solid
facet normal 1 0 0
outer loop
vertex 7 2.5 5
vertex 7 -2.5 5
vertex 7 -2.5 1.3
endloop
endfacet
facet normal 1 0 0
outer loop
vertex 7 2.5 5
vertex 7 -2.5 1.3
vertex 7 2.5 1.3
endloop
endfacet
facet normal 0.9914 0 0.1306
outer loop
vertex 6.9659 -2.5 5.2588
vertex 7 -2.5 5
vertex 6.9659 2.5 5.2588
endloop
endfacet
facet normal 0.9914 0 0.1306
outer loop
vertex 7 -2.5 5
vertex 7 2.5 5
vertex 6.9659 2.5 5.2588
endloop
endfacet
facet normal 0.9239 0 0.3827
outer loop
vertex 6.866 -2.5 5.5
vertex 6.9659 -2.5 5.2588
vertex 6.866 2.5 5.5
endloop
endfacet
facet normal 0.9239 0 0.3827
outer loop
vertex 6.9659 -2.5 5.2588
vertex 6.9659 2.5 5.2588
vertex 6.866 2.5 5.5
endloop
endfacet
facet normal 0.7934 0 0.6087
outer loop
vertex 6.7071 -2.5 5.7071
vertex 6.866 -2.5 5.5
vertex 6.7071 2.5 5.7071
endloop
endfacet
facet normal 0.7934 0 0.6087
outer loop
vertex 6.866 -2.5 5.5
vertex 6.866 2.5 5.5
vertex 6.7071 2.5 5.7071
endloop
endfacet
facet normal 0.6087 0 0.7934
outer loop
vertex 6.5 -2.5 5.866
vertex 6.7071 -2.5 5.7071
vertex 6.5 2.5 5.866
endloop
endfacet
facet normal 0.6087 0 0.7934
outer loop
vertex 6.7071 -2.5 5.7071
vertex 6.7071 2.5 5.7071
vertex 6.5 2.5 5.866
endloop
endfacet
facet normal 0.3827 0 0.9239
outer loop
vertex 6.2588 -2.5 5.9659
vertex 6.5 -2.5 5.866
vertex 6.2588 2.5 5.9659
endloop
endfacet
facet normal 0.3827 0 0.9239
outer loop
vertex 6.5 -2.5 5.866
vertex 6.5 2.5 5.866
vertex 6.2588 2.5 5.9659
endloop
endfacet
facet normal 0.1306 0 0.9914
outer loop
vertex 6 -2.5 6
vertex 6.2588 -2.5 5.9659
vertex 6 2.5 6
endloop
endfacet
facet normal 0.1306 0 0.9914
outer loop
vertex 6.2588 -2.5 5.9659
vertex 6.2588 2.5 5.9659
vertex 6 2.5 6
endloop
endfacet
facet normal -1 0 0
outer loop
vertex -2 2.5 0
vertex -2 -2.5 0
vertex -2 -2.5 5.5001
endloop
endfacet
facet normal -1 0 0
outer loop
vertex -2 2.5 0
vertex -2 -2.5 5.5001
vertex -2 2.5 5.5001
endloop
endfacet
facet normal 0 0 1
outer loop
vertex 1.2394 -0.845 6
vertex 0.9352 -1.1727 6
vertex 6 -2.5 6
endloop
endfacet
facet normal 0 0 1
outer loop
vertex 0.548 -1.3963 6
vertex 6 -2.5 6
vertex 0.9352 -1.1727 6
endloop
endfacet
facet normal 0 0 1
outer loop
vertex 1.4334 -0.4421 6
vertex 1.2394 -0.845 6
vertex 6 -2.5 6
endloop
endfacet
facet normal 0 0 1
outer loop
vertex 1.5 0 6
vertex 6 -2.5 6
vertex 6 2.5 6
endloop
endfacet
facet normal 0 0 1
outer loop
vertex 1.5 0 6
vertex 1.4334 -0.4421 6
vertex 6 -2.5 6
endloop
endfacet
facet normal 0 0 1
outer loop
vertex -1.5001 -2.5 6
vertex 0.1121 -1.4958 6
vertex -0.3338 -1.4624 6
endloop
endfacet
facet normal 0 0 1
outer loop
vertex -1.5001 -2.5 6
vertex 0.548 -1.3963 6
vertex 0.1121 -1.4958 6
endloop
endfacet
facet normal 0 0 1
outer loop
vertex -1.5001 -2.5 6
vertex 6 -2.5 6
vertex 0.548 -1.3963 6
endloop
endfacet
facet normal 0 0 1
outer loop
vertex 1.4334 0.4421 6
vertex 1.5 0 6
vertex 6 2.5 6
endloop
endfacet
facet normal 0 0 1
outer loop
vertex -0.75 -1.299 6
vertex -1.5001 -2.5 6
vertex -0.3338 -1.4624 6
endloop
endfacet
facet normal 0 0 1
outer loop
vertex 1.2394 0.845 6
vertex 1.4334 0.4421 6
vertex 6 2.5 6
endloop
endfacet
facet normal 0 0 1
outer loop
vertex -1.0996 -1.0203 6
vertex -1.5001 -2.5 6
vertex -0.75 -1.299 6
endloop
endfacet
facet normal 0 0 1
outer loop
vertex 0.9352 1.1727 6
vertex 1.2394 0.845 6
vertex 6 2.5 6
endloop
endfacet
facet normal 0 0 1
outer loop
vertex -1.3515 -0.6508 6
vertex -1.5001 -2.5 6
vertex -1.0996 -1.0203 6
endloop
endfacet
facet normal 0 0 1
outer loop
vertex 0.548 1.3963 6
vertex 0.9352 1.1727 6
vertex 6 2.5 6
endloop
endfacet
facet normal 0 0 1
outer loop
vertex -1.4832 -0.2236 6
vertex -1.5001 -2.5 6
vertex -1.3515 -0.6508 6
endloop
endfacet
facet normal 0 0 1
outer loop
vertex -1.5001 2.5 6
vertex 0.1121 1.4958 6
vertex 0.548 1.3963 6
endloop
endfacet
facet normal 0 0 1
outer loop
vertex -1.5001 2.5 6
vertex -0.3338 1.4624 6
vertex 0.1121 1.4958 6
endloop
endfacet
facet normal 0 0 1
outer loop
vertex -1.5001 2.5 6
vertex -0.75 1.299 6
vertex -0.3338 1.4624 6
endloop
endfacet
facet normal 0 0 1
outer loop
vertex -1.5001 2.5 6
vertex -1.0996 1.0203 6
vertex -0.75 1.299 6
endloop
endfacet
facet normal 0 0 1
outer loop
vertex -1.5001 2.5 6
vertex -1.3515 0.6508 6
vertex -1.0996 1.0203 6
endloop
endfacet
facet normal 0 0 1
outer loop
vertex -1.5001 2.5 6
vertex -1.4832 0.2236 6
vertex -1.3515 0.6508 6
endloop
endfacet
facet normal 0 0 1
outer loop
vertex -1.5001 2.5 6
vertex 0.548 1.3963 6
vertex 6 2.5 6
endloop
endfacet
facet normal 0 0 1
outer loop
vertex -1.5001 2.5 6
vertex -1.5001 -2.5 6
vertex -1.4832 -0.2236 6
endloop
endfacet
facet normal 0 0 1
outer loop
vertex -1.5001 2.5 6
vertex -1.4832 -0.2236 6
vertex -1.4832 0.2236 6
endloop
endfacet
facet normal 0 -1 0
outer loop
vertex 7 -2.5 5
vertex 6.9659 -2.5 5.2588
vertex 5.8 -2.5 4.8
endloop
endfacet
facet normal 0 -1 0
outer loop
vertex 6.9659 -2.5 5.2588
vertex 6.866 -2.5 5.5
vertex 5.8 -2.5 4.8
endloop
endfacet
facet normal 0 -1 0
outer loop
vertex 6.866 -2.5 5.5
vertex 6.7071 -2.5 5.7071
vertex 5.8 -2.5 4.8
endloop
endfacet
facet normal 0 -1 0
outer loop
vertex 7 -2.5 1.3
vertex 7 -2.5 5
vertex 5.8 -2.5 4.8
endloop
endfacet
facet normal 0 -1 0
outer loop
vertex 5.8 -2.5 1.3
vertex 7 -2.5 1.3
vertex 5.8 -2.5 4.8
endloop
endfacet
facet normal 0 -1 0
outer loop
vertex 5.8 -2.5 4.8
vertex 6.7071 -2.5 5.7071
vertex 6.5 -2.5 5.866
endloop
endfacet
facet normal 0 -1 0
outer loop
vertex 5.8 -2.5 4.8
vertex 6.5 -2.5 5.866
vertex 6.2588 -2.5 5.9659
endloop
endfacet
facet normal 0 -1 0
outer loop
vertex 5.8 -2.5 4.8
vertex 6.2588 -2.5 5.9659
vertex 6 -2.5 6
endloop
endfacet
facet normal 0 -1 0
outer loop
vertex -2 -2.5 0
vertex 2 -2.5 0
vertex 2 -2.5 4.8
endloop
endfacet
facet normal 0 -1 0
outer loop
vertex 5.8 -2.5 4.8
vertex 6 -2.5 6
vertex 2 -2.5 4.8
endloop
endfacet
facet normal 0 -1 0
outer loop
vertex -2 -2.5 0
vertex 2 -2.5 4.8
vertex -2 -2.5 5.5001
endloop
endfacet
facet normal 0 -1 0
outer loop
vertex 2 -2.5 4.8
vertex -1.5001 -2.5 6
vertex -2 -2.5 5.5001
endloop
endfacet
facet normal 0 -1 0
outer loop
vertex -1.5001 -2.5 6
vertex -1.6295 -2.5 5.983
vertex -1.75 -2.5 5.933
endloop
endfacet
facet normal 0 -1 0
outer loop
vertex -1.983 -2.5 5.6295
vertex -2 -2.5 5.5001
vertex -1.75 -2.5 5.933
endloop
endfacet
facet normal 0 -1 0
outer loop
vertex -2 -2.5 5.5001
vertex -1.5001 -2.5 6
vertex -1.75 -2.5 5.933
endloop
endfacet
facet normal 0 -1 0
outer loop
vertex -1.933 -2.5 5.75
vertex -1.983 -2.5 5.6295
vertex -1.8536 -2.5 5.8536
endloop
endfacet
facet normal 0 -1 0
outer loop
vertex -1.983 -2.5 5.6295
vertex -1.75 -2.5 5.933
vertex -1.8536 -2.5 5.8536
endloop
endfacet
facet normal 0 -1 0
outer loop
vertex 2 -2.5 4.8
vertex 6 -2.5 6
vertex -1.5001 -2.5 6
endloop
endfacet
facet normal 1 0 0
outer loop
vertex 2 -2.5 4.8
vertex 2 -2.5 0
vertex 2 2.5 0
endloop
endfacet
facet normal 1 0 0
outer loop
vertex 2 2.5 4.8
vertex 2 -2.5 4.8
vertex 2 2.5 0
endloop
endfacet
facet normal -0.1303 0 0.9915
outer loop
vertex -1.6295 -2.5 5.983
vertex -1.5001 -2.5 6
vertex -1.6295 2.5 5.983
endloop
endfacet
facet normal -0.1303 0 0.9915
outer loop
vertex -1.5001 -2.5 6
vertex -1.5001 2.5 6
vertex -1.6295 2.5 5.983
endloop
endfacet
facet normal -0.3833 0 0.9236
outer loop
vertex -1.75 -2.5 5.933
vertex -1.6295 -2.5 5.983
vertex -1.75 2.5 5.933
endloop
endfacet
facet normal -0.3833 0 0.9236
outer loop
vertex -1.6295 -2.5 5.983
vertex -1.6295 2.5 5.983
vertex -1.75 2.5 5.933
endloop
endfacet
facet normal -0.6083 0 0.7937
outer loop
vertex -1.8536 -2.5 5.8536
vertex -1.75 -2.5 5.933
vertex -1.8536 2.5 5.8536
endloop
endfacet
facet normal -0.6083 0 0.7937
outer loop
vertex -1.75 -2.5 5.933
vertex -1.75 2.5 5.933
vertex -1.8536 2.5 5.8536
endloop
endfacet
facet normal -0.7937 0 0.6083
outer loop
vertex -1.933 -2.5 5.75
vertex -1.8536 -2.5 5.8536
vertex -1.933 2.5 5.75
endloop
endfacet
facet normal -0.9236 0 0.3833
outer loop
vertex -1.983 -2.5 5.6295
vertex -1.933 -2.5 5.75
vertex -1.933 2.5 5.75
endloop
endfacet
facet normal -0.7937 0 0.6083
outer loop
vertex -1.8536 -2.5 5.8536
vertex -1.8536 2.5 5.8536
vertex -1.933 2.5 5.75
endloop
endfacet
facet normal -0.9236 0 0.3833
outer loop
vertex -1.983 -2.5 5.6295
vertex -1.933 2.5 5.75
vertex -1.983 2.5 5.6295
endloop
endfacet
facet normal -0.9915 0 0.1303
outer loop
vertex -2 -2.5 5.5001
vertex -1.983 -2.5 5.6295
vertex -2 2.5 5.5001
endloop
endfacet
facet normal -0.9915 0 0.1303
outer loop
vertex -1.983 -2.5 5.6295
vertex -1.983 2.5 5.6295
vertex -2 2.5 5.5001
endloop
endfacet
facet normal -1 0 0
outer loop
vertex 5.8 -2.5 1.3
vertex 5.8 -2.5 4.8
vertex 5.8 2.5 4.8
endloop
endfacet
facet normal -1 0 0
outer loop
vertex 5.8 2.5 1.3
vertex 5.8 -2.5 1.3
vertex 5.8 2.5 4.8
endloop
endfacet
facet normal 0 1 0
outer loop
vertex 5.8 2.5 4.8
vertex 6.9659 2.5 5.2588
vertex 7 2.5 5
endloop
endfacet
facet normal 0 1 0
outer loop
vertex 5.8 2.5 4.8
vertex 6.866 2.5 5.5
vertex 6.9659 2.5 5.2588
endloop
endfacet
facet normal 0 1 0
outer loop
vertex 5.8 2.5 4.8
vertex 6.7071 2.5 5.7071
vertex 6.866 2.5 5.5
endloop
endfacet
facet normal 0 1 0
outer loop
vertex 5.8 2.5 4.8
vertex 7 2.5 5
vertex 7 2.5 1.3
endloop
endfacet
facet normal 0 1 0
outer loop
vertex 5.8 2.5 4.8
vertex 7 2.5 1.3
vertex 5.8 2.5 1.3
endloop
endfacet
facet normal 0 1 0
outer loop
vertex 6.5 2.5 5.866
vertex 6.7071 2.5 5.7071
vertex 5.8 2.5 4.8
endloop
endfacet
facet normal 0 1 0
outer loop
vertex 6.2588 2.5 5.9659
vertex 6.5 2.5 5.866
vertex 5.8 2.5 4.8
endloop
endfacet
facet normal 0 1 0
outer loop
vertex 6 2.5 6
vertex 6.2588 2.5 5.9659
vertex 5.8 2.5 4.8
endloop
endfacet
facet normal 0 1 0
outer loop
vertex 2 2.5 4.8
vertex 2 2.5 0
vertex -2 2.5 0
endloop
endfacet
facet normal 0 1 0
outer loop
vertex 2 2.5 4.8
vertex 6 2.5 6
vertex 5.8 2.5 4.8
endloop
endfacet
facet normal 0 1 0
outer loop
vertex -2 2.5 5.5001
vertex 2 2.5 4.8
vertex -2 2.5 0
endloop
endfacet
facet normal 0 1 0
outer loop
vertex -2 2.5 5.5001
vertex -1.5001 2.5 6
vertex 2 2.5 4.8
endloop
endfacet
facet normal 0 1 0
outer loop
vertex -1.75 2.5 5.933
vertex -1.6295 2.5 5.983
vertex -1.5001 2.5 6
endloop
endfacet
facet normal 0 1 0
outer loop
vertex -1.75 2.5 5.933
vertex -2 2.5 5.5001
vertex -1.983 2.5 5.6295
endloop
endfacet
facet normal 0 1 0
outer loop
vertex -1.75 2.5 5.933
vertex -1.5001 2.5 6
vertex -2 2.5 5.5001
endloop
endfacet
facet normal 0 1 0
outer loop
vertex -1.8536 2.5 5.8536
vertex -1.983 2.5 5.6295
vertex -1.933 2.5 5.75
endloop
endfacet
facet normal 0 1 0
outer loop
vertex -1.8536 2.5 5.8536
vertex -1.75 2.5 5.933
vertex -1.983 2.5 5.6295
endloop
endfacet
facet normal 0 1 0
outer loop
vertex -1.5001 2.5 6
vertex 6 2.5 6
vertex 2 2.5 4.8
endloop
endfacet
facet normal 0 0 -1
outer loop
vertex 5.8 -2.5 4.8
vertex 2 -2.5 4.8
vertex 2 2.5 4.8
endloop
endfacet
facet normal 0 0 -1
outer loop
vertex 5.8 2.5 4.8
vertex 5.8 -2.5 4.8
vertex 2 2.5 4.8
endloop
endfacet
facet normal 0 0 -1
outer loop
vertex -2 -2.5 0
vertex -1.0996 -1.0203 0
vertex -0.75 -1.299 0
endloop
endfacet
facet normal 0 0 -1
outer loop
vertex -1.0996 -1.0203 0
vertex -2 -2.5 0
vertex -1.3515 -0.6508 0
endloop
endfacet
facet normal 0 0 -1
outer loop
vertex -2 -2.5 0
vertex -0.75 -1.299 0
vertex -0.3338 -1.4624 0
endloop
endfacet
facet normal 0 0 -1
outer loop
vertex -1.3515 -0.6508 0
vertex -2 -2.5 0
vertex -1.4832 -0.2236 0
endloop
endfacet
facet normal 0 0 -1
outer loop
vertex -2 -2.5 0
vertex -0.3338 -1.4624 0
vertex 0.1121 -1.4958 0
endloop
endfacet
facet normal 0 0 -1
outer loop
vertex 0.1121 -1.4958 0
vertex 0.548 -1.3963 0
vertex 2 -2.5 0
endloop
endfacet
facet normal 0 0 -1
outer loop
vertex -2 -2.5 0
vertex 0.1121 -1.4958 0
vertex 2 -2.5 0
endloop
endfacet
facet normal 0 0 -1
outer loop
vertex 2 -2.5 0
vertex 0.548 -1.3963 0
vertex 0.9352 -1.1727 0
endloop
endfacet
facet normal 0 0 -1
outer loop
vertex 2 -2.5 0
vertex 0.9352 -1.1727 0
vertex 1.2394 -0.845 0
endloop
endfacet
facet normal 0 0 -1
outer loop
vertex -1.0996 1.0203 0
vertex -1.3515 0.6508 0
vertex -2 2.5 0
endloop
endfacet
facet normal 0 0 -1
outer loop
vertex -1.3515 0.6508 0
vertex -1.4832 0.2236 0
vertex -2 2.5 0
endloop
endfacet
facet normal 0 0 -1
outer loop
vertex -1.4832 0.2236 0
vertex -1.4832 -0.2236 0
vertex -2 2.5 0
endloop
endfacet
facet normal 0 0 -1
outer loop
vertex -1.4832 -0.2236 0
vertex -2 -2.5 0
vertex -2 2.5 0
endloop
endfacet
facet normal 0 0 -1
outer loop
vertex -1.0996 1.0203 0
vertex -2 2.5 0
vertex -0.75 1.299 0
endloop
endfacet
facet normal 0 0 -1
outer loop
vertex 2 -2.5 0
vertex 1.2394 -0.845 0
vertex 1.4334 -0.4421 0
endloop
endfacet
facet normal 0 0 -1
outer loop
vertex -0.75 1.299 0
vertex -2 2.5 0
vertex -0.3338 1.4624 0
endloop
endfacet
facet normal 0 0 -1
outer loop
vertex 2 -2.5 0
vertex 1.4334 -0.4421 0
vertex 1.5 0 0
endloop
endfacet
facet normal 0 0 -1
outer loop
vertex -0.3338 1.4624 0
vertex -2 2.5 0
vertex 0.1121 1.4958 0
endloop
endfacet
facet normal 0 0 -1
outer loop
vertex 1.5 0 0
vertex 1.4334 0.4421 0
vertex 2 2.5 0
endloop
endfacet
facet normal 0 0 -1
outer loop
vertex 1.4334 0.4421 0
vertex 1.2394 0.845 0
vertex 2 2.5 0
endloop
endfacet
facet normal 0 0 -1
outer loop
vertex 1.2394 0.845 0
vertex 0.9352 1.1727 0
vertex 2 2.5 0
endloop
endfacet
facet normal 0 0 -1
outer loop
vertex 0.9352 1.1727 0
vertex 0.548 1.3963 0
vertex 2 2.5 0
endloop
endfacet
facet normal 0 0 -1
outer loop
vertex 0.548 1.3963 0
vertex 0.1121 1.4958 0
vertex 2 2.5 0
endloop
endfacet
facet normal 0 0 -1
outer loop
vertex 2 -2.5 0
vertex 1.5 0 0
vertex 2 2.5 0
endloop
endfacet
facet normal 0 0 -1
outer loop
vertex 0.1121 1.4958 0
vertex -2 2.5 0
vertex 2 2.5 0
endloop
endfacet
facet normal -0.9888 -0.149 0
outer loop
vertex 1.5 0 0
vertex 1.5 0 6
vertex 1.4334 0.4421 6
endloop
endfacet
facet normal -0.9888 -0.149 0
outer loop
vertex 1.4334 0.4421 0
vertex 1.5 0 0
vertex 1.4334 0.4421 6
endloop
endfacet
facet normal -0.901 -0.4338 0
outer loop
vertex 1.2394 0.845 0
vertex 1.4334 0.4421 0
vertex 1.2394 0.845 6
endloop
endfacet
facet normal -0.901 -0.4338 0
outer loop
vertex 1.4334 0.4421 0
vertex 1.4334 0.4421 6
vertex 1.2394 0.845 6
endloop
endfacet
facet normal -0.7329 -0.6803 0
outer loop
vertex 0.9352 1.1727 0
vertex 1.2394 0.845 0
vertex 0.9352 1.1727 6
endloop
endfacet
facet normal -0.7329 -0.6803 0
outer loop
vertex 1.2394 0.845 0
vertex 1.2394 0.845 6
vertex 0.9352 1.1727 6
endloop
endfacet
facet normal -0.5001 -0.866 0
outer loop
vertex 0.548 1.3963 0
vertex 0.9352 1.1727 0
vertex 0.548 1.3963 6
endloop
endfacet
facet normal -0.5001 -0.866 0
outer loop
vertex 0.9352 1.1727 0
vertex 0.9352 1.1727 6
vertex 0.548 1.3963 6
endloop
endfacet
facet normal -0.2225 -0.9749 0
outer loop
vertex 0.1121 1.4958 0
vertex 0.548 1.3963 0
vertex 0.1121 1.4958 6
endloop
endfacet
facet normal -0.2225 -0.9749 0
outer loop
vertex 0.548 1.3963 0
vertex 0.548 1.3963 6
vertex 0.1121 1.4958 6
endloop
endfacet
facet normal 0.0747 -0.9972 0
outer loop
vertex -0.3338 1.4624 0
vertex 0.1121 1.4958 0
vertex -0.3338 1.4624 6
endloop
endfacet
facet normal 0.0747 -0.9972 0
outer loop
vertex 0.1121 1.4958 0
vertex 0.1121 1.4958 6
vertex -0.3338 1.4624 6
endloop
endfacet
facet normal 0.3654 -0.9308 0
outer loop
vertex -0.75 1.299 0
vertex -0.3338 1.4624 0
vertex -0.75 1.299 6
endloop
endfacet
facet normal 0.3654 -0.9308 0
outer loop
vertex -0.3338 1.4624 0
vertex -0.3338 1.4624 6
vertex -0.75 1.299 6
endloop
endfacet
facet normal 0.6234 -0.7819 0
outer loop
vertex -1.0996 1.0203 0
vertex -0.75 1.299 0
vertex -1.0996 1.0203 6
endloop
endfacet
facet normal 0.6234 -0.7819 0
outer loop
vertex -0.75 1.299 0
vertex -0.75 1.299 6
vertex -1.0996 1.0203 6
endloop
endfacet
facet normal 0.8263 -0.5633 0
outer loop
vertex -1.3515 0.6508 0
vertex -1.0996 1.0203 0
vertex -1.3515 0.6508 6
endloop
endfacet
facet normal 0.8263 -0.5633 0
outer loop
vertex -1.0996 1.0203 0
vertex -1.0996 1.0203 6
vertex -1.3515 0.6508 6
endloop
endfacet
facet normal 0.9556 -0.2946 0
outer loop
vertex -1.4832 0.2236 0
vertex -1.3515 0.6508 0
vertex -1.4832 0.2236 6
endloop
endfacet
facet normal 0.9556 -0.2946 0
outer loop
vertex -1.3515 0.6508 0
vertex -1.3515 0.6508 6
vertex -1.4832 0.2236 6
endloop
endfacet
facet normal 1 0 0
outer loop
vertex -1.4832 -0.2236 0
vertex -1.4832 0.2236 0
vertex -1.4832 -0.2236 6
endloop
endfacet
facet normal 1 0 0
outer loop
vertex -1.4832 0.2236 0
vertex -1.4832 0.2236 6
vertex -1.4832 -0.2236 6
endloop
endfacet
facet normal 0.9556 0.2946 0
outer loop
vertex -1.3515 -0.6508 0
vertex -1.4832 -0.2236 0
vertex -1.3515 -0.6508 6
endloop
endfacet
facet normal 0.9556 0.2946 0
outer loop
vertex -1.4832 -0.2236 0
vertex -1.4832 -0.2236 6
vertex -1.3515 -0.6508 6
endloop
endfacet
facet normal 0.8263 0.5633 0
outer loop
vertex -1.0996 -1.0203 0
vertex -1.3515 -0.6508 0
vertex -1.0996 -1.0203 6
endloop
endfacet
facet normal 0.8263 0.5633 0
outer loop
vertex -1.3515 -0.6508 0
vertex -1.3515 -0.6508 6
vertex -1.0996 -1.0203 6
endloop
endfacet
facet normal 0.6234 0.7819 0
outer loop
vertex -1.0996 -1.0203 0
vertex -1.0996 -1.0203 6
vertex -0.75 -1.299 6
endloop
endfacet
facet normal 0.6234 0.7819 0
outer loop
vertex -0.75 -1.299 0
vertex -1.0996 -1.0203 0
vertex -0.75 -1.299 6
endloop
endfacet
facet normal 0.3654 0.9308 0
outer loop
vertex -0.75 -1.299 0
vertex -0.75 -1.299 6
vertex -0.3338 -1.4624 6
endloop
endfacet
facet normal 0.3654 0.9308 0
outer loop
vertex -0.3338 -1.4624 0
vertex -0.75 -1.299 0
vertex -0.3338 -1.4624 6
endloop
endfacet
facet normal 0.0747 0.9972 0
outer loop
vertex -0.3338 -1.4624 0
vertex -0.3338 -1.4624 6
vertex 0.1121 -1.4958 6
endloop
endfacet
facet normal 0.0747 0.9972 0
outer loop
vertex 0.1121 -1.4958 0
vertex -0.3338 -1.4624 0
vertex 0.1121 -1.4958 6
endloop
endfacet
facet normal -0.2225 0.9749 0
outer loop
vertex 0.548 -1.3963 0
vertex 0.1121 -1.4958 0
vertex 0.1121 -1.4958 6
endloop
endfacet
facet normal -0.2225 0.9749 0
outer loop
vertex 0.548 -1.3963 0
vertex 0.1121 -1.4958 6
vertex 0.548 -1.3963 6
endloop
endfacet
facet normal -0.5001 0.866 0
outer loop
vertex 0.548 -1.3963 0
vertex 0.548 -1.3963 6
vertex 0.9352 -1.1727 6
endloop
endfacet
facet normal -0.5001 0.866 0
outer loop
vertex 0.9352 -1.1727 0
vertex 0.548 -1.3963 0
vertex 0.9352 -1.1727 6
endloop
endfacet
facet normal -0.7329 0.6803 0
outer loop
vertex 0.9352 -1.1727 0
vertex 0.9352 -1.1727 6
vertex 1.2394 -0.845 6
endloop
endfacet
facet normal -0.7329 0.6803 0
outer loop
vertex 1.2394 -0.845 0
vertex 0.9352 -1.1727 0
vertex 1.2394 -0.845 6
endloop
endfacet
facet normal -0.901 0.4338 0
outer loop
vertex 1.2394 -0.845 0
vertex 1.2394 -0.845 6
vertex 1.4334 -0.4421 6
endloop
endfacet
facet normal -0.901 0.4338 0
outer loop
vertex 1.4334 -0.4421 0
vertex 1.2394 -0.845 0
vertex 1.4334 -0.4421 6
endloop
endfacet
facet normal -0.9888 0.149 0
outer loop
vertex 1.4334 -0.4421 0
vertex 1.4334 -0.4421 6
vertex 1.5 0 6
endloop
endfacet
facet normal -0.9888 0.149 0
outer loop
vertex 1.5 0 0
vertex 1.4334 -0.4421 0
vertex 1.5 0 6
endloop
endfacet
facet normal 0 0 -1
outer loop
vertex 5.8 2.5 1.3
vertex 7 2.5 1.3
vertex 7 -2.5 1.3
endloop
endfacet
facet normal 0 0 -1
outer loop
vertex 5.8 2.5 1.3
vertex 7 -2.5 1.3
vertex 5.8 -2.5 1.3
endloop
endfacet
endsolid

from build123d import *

# Parameters (mm, degrees)
SKETCH_1_W          = 4
SKETCH_1_H          = 5
EXTRUDE_1_DEPTH     = 6
SKETCH_4_W          = 1.2
SKETCH_4_H          = 5
EXTRUDE_2_DEPTH     = 5
SKETCH_5_W          = 1.2
SKETCH_5_H          = 5
EXTRUDE_3_DEPTH     = 3.5
FILLET_1_R          = 1
SKETCH_6_R          = 1.5
CUT_EXTRUDE_1_DEPTH = 10.552486587
FILLET_2_R          = 0.5


with BuildPart() as part:
    # 草图1 → 凸台-拉伸1 (new body)
    with BuildSketch(Plane.XY):
        Rectangle(SKETCH_1_W, SKETCH_1_H)
    extrude(amount=EXTRUDE_1_DEPTH)

    # 草图4 → 凸台-拉伸2 (add)
    with BuildSketch(Plane(origin=(2, 0, 0), x_dir=(0, 0, -1), z_dir=(1, 0, 0))):
        with Locations((-5.4, 0)):
            Rectangle(SKETCH_4_W, SKETCH_4_H)
    extrude(amount=EXTRUDE_2_DEPTH)

    # 草图5 → 凸台-拉伸3 (add)
    with BuildSketch(Plane(origin=(0, 0, 4.8), x_dir=(-1, 0, 0), z_dir=(0, 0, -1))):
        with Locations((-6.4, 0)):
            Rectangle(SKETCH_5_W, SKETCH_5_H)
    extrude(amount=EXTRUDE_3_DEPTH)

    # 圆角1
    fillet_1_edges = [part.edges().sort_by_distance(p)[0] for p in [
        (7, 0, 6),
    ]]
    fillet(fillet_1_edges, radius=FILLET_1_R)

    # 草图6 → 切除-拉伸1 (cut, through all)
    with BuildSketch(Plane.XY.offset(6)):
        Circle(SKETCH_6_R)
    extrude(amount=-CUT_EXTRUDE_1_DEPTH, mode=Mode.SUBTRACT)

    # 圆角2
    fillet_2_edges = [part.edges().sort_by_distance(p)[0] for p in [
        (-2, 0, 6),
    ]]
    fillet(fillet_2_edges, radius=FILLET_2_R - 0.0001)  # a hair under: the kernel refuses the full size


solid = part.part
